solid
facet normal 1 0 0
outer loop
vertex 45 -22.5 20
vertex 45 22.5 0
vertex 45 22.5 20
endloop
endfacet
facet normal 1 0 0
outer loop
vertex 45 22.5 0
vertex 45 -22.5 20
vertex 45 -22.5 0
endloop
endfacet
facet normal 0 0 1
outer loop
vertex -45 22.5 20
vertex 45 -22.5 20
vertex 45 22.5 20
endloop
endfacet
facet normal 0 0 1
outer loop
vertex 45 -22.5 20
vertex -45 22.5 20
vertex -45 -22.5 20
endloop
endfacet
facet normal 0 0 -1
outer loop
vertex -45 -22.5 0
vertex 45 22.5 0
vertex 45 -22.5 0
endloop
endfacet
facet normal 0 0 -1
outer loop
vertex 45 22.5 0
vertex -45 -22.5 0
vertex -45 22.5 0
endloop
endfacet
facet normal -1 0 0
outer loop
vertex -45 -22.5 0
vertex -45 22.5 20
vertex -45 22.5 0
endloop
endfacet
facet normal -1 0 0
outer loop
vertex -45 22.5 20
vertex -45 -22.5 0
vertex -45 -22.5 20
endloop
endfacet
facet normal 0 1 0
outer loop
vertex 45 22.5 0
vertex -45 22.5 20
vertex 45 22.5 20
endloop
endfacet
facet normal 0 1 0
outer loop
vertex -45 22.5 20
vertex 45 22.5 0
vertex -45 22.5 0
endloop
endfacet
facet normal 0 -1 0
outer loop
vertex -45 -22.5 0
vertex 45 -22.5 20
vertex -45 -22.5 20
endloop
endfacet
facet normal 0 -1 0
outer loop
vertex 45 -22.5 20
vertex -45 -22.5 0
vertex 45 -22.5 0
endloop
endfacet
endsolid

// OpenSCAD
// Built by bench/smallmodels/features/compiler.py from a list of features.
$fn = 64;
difference() {
  union() {
    translate([0, 0, 0]) translate([-45, -22.5, 0]) cube([90, 45, 20]);
  }
  union() {
    translate([0, -38.5, 9.99]) rotate([0, 0, 0]) hull() { for (s = [-1, 1]) translate([s * 37.7, 0, 0]) cylinder(d = 1.6, h = 10.02); }
  }
}
